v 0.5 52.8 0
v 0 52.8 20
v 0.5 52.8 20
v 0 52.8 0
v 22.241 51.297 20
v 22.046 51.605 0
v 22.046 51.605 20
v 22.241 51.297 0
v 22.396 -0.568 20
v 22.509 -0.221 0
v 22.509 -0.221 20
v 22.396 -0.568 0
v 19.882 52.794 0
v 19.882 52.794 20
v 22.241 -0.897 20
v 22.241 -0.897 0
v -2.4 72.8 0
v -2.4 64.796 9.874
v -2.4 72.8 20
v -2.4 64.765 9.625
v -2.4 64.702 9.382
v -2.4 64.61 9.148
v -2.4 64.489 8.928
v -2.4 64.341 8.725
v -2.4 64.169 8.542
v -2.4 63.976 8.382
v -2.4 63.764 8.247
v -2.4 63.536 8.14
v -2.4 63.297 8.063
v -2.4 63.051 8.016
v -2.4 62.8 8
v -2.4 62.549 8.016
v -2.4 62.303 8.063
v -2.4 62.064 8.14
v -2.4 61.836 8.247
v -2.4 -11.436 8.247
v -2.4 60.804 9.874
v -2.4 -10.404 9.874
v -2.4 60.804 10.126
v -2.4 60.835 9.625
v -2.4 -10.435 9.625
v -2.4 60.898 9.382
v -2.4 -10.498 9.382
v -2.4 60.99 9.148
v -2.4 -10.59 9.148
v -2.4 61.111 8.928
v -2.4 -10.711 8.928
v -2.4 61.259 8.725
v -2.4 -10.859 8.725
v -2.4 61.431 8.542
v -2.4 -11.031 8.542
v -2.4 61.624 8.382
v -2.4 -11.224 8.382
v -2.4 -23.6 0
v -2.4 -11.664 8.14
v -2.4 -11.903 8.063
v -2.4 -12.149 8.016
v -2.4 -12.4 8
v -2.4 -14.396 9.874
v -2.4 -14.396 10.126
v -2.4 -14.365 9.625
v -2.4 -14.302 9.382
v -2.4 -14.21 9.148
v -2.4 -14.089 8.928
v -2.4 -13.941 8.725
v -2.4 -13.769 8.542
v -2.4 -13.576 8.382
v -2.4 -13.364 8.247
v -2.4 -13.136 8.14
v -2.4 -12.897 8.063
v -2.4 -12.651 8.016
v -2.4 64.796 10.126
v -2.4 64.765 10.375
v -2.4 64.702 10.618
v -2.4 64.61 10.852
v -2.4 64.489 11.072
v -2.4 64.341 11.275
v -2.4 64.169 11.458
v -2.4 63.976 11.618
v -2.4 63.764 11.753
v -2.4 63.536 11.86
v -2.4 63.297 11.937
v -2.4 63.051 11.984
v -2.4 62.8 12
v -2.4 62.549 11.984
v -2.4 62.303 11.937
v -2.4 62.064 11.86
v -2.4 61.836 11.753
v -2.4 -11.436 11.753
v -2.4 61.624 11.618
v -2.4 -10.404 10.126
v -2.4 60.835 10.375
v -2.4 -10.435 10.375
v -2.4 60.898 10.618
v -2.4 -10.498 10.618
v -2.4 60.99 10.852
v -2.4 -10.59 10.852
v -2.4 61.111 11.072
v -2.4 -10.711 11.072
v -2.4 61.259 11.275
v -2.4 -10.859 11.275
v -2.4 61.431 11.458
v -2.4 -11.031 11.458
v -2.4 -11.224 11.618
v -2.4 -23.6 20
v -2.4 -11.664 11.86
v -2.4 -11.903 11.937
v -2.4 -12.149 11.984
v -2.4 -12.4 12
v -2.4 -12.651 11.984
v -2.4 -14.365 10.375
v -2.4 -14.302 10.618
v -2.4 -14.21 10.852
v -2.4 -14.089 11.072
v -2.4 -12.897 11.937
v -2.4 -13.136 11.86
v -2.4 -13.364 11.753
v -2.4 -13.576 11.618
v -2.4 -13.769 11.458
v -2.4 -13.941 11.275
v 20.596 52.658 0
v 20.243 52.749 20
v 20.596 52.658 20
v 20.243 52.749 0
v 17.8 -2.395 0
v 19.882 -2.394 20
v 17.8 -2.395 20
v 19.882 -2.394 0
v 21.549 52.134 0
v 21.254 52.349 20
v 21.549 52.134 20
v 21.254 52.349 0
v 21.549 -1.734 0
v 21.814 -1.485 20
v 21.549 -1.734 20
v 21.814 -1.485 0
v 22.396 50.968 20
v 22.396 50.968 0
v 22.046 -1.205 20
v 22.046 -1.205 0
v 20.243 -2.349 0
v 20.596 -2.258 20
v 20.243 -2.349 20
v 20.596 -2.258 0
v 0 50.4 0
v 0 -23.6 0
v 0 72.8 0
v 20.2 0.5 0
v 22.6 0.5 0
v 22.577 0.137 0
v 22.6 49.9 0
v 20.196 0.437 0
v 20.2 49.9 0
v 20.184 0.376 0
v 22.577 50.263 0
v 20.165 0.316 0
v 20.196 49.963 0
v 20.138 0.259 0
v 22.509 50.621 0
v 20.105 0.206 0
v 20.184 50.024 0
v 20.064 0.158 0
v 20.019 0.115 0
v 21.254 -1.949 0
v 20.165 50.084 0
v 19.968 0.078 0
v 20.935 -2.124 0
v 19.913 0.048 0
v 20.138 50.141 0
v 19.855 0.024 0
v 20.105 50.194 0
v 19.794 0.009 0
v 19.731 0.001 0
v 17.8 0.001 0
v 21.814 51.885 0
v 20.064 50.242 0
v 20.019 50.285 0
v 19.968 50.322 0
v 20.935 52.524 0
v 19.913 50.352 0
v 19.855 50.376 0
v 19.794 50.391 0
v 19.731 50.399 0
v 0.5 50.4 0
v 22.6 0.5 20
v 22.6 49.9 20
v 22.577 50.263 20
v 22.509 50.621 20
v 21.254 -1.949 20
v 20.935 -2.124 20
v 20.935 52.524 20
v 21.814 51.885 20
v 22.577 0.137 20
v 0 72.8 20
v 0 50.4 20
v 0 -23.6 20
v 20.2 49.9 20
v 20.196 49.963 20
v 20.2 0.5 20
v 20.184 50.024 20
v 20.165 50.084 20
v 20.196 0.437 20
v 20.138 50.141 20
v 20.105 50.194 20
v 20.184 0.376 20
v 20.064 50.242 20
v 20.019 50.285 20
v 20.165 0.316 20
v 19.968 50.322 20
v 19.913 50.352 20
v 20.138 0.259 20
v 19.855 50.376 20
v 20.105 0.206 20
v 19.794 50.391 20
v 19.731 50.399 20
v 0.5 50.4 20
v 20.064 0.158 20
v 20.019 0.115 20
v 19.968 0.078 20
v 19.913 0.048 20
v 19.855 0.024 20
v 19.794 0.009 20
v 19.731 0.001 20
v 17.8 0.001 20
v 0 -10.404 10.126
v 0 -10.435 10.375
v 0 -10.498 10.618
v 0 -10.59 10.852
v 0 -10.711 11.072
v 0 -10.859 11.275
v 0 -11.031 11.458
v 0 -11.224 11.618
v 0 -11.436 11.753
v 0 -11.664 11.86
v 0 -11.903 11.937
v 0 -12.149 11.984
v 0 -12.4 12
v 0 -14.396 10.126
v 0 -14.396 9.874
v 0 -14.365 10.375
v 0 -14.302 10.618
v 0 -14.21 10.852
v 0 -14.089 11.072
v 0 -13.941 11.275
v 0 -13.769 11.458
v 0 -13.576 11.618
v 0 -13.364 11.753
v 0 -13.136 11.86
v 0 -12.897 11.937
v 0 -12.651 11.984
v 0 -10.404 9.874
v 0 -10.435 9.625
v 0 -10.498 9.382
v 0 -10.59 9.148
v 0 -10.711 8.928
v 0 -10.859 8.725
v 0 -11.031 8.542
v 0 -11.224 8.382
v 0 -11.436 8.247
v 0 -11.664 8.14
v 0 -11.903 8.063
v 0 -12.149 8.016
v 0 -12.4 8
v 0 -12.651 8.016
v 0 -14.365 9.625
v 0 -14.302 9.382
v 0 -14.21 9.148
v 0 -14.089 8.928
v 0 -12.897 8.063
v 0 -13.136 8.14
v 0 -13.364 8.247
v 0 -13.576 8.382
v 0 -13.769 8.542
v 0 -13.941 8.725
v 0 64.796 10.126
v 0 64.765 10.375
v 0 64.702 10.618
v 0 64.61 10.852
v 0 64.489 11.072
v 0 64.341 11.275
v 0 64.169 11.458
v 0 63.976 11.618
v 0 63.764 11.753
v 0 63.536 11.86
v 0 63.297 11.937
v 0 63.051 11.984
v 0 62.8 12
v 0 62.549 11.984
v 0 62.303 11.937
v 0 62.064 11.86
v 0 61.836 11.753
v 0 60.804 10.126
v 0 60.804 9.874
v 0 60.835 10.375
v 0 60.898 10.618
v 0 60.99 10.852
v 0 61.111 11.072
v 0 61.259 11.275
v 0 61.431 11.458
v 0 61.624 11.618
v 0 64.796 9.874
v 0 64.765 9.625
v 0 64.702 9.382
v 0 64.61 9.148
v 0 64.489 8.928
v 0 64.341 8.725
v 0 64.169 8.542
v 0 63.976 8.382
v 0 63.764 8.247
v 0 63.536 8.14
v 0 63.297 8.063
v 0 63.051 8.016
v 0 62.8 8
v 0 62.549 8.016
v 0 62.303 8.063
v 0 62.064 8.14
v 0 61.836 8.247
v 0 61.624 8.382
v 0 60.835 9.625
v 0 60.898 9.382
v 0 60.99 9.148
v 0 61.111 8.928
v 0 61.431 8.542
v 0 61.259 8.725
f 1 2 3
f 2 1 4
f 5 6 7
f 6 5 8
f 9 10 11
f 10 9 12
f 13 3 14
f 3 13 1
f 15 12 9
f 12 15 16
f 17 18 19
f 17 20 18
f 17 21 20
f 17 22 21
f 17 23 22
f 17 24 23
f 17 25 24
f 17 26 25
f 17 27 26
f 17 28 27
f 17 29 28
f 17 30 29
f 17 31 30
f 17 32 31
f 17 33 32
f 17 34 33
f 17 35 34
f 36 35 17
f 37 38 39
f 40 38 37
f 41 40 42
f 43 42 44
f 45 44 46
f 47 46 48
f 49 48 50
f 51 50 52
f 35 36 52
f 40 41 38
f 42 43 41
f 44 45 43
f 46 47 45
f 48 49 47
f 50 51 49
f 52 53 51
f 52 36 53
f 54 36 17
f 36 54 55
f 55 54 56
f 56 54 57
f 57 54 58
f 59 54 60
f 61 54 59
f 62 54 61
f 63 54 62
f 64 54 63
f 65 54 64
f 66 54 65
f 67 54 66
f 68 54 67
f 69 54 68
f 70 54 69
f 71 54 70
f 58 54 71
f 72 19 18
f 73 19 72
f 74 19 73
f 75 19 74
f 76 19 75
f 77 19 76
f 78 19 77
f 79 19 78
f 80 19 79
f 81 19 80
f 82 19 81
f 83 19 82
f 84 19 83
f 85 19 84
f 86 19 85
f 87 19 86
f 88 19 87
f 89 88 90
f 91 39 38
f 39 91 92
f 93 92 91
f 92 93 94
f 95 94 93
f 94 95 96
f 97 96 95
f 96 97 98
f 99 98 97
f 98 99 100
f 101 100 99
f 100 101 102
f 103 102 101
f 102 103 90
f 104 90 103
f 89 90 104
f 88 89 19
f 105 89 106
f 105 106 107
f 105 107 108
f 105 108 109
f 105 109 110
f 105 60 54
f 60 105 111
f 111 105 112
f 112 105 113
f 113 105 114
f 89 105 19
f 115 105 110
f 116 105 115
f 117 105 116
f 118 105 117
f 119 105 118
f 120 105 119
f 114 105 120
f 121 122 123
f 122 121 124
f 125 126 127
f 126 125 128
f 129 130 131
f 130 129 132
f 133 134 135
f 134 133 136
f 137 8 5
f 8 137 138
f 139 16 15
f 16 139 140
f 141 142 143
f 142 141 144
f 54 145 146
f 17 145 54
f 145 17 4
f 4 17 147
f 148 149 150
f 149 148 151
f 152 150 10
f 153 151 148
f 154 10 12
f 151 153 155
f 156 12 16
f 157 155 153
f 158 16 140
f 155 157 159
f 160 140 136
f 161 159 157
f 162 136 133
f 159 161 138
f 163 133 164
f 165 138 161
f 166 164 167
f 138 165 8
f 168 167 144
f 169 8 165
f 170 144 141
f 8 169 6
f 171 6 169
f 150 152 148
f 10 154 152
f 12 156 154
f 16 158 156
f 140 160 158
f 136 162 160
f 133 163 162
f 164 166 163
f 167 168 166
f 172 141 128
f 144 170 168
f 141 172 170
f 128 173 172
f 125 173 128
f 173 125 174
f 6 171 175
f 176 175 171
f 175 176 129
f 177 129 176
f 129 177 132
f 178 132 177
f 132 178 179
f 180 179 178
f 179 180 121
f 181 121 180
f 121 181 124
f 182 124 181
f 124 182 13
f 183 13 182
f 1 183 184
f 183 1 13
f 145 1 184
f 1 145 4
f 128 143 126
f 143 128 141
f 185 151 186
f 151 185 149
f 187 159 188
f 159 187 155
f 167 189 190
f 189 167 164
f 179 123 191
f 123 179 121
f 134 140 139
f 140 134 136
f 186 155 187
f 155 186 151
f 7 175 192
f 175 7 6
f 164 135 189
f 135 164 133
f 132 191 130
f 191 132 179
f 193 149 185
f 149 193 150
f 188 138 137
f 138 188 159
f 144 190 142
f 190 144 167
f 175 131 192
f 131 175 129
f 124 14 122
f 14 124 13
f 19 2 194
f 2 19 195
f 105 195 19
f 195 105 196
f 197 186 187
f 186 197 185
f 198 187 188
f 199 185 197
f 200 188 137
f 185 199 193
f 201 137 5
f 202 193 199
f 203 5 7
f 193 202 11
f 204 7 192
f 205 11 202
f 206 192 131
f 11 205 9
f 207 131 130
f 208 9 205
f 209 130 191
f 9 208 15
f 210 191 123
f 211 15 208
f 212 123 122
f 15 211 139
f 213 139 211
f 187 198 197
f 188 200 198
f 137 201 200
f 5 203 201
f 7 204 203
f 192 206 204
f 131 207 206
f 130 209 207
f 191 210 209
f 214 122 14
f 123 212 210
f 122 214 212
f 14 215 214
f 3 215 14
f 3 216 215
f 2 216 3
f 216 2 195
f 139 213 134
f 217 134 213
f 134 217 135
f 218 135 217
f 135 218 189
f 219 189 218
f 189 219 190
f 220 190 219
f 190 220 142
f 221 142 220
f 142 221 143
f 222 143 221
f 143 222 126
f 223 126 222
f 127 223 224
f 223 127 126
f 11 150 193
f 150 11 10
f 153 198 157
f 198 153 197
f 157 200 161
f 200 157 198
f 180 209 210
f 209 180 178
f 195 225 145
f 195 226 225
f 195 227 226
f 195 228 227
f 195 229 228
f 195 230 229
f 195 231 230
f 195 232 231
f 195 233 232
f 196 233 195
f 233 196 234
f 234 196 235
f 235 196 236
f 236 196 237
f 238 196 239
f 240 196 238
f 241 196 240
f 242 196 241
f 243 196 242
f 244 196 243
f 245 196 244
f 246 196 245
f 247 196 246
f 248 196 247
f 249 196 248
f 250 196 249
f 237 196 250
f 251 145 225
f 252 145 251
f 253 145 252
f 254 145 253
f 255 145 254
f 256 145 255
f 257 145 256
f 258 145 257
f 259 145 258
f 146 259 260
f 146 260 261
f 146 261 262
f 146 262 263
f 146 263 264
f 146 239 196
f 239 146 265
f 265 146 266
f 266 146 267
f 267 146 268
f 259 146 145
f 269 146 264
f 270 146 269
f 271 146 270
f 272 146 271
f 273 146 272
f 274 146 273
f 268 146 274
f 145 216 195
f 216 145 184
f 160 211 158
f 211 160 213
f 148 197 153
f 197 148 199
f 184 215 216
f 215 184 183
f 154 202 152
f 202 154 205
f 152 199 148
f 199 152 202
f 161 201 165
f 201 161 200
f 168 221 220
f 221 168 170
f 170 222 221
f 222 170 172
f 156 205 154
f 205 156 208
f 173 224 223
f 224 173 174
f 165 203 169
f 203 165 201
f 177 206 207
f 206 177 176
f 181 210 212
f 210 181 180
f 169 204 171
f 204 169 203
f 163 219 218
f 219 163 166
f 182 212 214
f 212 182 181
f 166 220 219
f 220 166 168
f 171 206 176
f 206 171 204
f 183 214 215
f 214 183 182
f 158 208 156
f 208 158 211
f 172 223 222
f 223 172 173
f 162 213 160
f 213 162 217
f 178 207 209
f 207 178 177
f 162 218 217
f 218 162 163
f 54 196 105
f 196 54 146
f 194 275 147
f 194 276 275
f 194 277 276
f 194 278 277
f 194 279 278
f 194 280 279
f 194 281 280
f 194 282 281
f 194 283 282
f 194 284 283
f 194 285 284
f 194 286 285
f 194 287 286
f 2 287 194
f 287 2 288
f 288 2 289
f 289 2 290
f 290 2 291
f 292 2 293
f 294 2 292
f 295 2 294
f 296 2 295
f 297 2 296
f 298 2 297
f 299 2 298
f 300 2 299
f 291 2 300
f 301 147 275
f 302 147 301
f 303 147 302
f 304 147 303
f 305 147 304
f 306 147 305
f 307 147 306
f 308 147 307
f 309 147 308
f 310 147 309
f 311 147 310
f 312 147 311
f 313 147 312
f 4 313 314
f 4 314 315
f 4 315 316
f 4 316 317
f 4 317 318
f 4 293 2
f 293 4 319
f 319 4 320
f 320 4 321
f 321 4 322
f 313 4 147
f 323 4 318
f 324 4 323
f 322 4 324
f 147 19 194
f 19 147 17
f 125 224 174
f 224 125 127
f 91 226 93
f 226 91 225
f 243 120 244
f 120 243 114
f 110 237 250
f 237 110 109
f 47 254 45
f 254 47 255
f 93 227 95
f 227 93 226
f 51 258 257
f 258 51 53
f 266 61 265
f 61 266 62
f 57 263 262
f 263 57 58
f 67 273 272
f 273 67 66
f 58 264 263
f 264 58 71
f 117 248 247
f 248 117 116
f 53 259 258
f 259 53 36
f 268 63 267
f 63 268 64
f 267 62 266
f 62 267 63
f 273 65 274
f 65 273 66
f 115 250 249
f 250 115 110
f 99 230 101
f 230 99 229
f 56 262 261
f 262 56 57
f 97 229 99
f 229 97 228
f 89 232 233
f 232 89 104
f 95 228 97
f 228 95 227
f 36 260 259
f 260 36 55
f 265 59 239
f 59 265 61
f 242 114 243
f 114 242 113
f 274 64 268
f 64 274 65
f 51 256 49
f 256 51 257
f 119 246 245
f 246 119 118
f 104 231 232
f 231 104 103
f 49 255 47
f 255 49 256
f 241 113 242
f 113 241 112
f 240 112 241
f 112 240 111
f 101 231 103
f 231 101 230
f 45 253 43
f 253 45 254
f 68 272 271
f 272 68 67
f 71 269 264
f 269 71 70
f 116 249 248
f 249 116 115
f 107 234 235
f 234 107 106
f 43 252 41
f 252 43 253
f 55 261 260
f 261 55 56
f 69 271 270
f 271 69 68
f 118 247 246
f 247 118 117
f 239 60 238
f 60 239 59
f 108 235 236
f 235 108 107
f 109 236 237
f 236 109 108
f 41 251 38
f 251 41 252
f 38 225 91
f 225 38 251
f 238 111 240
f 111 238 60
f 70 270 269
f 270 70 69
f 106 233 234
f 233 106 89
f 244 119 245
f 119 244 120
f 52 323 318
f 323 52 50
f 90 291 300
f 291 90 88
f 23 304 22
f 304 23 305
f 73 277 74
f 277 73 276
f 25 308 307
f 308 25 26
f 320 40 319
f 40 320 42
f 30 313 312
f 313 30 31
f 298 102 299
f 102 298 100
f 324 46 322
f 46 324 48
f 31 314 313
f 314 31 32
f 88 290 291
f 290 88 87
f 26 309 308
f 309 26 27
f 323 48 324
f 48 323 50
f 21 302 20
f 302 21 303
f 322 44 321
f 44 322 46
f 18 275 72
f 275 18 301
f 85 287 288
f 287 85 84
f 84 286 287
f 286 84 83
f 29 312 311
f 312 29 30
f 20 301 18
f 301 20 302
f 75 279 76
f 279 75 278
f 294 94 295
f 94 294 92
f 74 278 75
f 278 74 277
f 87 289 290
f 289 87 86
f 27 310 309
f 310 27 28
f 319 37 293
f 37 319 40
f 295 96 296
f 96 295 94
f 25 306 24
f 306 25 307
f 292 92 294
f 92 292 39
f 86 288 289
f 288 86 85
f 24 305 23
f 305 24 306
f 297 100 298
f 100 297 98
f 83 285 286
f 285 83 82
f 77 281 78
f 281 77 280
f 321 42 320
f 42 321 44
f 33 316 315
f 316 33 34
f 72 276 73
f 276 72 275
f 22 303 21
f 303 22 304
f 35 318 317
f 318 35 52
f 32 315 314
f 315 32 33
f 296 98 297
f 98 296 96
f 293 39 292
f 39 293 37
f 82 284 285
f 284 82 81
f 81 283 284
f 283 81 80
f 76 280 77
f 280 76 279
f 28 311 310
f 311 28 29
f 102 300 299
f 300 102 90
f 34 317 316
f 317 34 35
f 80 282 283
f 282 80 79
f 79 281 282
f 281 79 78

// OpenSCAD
// dimensions of Raspberry Pi 4 w/ Armor case
charger_h = 20;
charger_w = 50.2;
charger_l = 90;
charger_chamfer_r = 0.5;

wall_thickness = 6 * 0.4;

$fn=50;

// charger debug box
// #translate([0,0,0.1]) cube([charger_h, charger_w, charger_l]);

// bracket
bracket_w = 0.2 + charger_h;
bracket_l = 0.2 + charger_w;
bracket_h = 20;
difference() {
  union() {
    difference() {
      translate([-wall_thickness, -wall_thickness, 0])
        rounded_box(bracket_w + 2*wall_thickness, bracket_l + 2*wall_thickness, bracket_h, charger_chamfer_r + wall_thickness);
      translate([0,0,-bracket_h])
        rounded_box(bracket_w, bracket_l, 3*bracket_h, charger_chamfer_r);
    }

    translate([-wall_thickness, -bracket_h-1.5*wall_thickness, 0])
      cube([wall_thickness, bracket_h+wall_thickness, bracket_h]);

    translate([-wall_thickness, bracket_l, 0])
      cube([wall_thickness, bracket_h+wall_thickness, bracket_h]);
  }

  // thin slice
  translate([0, -2*bracket_h, -bracket_h])
    cube([bracket_w - wall_thickness, 3*bracket_h, 3*bracket_h]);

  // screw holes
  translate([0, -wall_thickness-bracket_h/2, bracket_h/2])
  rotate([0, 90, 0])
    cylinder(d = 4, h = 5*wall_thickness, center = true);

  translate([0, bracket_l+wall_thickness+bracket_h/2, bracket_h/2])
  rotate([0, 90, 0])
    cylinder(d = 4, h = 5*wall_thickness, center = true);
}

module rounded_box(w, l, h, r) {
  hull() {
    cube([r,r,h]);
    translate([0, l-r, 0]) cube([r,r,h]);
    // translate([r,   l-r, 0]) cylinder(r = r, h = h);
    translate([w-r, l-r, 0]) cylinder(r = r, h = h);
    translate([w-r, r,   0]) cylinder(r = r, h = h);
  }
}
